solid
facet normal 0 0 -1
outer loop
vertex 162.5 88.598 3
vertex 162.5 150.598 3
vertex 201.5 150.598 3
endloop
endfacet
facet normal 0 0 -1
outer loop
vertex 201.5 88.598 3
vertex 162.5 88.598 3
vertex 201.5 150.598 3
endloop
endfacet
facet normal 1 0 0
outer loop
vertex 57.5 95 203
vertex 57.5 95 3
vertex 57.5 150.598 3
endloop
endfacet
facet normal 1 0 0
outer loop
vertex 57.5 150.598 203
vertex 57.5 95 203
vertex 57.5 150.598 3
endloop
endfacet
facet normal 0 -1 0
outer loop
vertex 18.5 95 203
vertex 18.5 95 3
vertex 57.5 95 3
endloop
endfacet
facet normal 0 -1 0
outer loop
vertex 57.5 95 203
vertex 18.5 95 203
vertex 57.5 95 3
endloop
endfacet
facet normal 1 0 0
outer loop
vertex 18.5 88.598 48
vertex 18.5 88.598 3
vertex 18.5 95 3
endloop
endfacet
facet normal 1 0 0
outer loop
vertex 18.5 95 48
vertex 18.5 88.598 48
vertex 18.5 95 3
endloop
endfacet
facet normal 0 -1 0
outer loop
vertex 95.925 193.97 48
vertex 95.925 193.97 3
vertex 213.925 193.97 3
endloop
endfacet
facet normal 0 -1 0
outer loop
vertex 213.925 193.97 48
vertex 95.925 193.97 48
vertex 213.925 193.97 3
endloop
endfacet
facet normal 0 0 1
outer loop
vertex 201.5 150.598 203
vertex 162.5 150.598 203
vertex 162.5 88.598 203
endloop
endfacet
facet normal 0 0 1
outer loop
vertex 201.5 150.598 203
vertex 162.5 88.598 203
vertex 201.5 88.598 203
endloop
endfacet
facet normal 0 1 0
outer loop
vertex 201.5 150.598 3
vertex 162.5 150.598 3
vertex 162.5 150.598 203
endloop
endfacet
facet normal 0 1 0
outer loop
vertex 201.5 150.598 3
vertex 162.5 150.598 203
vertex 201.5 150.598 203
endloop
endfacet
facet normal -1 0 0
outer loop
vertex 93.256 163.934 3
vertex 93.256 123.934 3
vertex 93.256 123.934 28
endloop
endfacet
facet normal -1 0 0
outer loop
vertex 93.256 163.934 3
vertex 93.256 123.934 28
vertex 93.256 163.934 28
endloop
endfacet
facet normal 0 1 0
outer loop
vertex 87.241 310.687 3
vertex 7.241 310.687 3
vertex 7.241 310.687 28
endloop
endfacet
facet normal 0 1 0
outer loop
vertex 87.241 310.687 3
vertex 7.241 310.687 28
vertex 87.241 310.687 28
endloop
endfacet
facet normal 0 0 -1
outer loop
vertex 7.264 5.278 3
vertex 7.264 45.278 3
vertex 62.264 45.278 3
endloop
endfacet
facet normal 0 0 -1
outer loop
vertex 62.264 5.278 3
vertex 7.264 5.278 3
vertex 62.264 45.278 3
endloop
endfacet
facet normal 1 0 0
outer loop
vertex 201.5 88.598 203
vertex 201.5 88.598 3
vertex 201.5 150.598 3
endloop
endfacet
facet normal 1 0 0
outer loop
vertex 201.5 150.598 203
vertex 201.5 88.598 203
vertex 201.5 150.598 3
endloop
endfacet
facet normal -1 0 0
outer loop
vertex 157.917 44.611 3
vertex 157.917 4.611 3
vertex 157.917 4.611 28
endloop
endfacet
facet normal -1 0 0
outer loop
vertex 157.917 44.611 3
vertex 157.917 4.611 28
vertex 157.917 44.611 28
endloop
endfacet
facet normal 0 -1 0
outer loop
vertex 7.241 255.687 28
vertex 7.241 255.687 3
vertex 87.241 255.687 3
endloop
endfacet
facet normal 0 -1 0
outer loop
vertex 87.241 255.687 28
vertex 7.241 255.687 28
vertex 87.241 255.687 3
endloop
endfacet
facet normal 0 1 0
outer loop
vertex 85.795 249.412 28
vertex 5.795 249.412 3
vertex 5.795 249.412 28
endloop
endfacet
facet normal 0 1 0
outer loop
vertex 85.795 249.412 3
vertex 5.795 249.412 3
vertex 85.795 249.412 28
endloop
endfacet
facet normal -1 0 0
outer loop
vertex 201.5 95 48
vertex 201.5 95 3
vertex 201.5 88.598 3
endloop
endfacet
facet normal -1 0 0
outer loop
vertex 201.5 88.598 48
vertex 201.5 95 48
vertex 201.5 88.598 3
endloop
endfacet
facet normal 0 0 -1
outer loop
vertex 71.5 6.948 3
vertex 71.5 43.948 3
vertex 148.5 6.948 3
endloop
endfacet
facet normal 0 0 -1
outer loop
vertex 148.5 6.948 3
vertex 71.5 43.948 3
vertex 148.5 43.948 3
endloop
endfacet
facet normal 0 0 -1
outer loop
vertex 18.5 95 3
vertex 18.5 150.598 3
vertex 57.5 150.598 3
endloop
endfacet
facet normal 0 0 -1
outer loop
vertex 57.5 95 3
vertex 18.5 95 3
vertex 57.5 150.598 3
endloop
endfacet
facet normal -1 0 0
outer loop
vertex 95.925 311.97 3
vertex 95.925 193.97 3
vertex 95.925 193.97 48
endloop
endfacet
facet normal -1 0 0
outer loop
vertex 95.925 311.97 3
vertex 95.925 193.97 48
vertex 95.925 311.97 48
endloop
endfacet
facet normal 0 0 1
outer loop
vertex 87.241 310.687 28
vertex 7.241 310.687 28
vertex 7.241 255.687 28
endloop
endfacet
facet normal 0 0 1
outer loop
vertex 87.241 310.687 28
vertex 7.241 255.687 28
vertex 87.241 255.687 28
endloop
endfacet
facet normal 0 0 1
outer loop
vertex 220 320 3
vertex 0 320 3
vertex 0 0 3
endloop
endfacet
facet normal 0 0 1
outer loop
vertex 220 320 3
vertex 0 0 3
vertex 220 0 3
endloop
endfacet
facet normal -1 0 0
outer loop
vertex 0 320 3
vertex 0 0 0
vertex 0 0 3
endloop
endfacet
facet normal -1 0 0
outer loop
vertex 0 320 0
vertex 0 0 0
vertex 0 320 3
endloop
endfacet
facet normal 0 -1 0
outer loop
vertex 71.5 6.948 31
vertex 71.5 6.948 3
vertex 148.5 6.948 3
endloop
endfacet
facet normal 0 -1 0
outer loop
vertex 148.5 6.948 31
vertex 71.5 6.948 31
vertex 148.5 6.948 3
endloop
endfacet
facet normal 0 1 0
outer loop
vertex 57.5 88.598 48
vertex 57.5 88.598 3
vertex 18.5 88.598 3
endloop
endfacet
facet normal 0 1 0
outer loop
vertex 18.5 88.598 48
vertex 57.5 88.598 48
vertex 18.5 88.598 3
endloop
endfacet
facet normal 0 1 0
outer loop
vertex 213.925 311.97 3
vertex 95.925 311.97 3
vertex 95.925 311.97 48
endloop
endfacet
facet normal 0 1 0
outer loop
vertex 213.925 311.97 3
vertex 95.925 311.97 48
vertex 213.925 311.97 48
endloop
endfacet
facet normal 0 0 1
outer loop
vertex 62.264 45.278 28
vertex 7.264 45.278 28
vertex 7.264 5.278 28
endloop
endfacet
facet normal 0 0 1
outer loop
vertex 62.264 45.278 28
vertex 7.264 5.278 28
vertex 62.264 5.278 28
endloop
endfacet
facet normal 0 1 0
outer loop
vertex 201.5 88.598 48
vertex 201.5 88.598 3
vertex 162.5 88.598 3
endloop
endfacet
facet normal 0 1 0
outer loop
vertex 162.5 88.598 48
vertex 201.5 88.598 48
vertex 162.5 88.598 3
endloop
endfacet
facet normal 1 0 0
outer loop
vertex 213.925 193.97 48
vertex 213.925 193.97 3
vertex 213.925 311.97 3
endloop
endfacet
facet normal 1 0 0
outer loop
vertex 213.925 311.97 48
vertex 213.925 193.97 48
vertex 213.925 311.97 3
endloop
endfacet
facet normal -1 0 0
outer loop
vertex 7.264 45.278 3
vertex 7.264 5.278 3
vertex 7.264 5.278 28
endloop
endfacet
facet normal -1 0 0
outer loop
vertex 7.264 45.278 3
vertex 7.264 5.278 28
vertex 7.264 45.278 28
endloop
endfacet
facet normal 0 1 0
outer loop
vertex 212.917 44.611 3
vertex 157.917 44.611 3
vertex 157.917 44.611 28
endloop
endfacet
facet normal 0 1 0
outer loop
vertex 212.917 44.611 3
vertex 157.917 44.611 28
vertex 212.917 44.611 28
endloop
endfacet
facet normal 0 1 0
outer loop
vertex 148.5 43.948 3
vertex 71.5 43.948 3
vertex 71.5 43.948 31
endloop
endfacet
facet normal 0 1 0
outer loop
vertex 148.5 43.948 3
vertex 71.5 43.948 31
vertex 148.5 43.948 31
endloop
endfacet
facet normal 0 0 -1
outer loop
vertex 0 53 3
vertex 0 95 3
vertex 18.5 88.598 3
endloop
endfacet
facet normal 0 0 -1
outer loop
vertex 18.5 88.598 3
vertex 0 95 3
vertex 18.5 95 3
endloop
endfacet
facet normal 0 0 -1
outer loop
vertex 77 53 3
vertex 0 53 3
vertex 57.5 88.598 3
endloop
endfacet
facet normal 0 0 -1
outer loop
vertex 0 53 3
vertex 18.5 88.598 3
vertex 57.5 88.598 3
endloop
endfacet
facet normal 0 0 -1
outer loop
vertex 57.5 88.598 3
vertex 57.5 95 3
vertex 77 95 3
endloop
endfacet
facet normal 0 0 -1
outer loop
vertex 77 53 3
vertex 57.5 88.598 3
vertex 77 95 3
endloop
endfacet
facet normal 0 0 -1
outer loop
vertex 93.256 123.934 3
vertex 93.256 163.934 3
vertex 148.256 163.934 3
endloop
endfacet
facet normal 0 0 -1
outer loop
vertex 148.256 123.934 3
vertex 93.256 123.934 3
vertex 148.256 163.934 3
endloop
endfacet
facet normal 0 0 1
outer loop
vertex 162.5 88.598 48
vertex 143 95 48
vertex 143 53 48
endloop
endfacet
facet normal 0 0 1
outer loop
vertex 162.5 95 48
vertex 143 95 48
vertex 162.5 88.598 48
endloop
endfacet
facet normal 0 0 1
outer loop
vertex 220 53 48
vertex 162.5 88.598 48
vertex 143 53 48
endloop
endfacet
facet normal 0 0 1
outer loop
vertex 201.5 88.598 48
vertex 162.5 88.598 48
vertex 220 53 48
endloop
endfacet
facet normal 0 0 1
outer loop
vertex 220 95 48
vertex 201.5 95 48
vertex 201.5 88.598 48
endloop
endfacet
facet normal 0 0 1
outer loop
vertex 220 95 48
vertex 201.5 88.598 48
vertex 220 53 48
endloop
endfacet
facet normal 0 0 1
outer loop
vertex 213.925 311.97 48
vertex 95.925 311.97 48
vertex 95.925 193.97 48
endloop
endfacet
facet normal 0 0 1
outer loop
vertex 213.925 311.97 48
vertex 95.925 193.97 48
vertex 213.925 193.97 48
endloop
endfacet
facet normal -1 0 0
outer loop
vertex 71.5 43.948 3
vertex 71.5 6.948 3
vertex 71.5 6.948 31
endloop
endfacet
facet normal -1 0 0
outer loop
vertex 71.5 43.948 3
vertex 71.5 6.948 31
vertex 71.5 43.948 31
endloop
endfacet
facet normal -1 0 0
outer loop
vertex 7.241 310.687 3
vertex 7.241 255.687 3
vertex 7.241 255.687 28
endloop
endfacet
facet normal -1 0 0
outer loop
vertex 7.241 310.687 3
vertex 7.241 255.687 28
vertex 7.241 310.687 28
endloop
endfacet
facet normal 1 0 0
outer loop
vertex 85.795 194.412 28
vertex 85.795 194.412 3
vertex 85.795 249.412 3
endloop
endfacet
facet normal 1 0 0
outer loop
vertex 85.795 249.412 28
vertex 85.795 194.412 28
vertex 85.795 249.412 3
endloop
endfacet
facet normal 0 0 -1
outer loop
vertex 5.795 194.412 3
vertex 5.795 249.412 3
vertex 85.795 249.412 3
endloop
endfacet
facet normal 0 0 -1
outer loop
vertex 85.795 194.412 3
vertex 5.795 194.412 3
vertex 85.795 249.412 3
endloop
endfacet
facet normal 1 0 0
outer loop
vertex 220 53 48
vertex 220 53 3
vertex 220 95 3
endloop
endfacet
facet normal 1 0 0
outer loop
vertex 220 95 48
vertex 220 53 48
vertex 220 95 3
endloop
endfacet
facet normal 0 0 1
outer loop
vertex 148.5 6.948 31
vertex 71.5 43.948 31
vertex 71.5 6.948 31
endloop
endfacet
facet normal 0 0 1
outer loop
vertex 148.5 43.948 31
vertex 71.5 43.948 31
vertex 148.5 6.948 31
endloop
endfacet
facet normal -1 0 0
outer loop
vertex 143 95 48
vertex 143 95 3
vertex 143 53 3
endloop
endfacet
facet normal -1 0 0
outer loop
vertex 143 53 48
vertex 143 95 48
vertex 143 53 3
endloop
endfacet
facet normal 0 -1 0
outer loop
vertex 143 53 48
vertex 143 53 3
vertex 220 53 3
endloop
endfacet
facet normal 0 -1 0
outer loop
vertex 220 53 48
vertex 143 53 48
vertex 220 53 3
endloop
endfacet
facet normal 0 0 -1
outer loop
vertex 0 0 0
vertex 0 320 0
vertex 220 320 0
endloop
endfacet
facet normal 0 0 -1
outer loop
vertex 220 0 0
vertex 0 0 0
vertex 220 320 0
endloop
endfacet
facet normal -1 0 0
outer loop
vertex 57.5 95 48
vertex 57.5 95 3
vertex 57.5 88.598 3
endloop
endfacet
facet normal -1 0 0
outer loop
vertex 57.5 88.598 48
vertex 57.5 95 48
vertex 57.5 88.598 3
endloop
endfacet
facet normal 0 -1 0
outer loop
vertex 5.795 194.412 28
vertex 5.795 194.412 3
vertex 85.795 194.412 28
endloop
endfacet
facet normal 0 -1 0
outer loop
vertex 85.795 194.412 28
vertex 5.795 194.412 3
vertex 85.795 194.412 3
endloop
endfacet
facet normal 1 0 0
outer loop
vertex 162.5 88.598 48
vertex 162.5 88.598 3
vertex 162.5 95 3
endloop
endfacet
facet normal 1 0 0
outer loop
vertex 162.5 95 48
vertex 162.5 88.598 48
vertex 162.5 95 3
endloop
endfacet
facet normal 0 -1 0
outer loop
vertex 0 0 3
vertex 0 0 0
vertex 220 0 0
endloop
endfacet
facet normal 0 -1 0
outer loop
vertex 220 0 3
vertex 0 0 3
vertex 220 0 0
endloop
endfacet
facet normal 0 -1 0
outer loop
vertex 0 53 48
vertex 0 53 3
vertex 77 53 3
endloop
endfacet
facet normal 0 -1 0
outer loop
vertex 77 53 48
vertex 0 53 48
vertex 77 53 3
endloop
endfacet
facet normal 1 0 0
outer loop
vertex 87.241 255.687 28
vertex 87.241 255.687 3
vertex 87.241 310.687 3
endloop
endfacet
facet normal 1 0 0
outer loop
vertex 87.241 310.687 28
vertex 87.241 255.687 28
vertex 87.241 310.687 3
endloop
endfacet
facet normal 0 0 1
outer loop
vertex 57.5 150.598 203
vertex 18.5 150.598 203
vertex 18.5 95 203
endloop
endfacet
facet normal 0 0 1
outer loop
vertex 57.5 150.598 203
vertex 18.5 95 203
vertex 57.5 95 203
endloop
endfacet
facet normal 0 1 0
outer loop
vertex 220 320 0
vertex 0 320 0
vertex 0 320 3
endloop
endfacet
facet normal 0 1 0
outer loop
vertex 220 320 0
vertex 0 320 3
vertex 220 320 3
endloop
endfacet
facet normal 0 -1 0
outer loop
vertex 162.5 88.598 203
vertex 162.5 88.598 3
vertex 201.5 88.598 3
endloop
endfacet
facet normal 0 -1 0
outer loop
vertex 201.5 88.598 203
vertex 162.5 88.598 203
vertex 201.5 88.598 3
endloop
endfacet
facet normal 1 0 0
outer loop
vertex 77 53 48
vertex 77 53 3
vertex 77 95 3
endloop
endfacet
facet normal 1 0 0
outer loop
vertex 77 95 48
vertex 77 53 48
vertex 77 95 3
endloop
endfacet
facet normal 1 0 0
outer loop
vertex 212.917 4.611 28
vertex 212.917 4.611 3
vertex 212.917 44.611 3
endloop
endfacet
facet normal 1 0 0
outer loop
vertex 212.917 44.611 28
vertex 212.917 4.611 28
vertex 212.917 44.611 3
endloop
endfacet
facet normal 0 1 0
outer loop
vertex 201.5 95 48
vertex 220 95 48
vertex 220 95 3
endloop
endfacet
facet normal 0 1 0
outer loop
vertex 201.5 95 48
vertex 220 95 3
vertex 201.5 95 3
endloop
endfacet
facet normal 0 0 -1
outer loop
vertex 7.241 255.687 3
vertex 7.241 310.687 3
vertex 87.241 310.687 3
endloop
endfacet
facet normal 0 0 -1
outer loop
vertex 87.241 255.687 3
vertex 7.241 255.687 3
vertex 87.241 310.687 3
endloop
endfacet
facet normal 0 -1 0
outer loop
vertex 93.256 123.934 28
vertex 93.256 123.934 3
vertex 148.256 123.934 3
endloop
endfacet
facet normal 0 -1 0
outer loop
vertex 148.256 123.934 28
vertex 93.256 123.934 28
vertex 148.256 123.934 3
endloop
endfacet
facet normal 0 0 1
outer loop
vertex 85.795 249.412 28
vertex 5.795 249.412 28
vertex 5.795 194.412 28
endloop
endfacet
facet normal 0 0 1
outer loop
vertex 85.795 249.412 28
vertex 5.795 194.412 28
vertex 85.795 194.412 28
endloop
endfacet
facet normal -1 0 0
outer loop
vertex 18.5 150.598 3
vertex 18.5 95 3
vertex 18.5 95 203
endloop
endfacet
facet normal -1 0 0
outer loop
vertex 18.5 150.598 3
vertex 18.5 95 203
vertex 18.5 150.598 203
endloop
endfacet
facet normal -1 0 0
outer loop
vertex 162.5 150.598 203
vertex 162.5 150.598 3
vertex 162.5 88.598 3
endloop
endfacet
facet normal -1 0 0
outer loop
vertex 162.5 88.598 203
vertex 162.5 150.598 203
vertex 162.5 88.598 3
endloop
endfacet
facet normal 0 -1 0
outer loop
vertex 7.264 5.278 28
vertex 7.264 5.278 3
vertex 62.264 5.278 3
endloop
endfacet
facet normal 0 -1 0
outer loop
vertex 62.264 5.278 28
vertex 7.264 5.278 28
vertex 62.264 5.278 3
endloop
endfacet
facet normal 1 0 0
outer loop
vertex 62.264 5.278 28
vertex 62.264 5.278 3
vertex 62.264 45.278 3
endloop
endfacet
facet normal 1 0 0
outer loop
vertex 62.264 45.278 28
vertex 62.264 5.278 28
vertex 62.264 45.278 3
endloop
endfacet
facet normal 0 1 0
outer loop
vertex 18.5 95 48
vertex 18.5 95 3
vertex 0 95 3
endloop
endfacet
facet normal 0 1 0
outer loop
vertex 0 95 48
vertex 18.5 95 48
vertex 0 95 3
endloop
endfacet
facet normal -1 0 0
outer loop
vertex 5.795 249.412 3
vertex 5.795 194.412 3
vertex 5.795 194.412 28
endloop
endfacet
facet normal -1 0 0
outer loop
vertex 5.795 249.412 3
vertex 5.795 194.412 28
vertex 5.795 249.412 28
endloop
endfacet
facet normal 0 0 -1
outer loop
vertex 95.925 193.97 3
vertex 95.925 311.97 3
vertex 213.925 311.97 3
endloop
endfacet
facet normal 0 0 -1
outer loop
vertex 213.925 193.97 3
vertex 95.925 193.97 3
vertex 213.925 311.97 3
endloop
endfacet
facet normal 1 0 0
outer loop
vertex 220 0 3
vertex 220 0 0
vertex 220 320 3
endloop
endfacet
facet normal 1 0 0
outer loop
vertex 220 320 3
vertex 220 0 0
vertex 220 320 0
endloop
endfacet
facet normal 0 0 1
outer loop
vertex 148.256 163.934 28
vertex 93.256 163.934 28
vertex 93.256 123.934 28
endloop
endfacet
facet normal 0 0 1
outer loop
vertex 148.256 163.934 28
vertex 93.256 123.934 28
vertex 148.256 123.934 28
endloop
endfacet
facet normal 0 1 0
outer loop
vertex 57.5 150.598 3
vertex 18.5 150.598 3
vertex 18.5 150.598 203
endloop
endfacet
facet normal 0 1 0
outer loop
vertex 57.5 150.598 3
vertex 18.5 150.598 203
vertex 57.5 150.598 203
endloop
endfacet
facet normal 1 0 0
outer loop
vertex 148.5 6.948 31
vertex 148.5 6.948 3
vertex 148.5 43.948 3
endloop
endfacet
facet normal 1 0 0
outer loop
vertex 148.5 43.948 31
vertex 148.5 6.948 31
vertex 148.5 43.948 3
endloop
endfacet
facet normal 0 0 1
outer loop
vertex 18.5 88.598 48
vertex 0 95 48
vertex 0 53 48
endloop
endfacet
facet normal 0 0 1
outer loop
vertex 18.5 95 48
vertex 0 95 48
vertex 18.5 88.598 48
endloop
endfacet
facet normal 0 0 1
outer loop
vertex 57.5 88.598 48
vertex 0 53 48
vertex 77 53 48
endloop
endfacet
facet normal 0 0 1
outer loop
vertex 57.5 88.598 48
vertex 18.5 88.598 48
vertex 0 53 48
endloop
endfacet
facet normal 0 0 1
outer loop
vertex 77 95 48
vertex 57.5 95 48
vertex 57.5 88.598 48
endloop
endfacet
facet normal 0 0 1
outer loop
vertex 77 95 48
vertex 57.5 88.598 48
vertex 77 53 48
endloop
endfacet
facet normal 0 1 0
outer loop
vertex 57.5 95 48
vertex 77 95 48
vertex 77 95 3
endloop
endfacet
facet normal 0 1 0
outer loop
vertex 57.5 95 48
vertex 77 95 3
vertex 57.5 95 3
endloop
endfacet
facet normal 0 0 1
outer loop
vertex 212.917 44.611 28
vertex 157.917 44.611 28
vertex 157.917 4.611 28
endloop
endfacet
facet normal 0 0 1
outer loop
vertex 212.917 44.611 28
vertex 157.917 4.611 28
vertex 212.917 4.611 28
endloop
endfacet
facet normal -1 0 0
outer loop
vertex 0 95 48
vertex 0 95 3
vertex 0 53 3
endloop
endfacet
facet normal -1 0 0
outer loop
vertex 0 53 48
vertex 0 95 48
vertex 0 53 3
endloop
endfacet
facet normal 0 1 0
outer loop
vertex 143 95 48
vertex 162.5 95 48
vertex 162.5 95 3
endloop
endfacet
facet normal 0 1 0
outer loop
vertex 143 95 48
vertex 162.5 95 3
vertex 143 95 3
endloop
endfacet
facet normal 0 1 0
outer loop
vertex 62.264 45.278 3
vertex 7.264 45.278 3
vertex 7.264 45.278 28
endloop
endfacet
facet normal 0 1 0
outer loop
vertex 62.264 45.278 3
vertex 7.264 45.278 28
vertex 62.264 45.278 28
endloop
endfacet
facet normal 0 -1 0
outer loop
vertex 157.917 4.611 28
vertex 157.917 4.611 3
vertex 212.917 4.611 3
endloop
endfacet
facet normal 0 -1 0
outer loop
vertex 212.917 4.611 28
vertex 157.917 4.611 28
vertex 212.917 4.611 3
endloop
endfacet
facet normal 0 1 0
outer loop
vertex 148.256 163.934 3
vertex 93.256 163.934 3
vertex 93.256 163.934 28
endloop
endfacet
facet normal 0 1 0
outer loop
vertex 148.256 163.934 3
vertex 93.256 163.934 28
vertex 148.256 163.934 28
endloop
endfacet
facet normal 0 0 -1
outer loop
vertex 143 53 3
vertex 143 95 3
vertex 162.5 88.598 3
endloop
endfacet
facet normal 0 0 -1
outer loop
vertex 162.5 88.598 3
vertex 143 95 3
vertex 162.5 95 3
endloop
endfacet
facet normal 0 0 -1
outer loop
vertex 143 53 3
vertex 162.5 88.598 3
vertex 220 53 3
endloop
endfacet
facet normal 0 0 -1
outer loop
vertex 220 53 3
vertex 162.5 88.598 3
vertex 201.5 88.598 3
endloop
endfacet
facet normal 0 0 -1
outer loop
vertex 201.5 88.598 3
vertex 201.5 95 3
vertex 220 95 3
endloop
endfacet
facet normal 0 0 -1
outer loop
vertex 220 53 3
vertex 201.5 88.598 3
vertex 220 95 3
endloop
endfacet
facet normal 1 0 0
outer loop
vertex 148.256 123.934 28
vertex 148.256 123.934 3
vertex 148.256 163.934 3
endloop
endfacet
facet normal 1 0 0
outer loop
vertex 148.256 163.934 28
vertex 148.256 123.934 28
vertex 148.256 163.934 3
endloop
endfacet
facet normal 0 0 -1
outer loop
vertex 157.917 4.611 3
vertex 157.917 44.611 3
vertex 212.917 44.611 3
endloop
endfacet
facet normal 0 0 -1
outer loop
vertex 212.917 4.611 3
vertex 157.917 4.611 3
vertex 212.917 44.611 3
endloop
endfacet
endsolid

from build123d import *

# Parameters (mm, degrees)
F0_W     = 220
F0_H     = 320
F1_DEPTH = 3
F2_W     = 118
F2_H     = 118
F3_DEPTH = 45
F2_W_2   = 39
F2_H_2   = 55.5978671312
F2_H_3   = 6.4021328688
F4_DEPTH = 200
F2_W_3   = 55
F2_H_4   = 40
F5_DEPTH = 25
F2_W_4   = 80
F2_H_5   = 55
F6_DEPTH = 25
F7_DEPTH = 45
F2_W_5   = 77
F2_H_6   = 37
F8_DEPTH = 28


with BuildPart() as f1:
    # F0 (on Top) → F1 (new body)
    with BuildSketch(Plane.XY):
        with Locations((110, 160)):
            Rectangle(F0_W, F0_H)
    extrude(amount=F1_DEPTH)


with BuildPart() as f3:
    # F2 (on face) → F3 (new body)
    with BuildSketch(Plane.XY.offset(3)):
        with Locations((154.9253612757, 252.969533205)):
            Rectangle(F2_W, F2_H)
    extrude(amount=F3_DEPTH)


with BuildPart() as f4:
    # F2 (on face) → F4 (new body)
    with BuildSketch(Plane.XY.offset(3)):
        with Locations((182, 122.7989335656)):
            Rectangle(F2_W_2, F2_H_2)
        with Locations((182, 91.7989335656)):
            Rectangle(F2_W_2, F2_H_3)
    extrude(amount=F4_DEPTH)


with BuildPart() as f4b:
    # F2 (on face) → F4, piece 2 (new body)
    with BuildSketch(Plane.XY.offset(3)):
        with Locations((38, 122.7989335656)):
            Rectangle(F2_W_2, F2_H_2)
    extrude(amount=F4_DEPTH)


with BuildPart() as f5:
    # F2 (on face) → F5 (new body)
    with BuildSketch(Plane.XY.offset(3)):
        with Locations((120.7562312484, 143.9338475466)):
            Rectangle(F2_W_3, F2_H_4)
    extrude(amount=F5_DEPTH)


with BuildPart() as f5b:
    # F2 (on face) → F5, piece 2 (new body)
    with BuildSketch(Plane.XY.offset(3)):
        with Locations((34.76376459, 25.2775717527)):
            Rectangle(F2_W_3, F2_H_4)
    extrude(amount=F5_DEPTH)


with BuildPart() as f5c:
    # F2 (on face) → F5, piece 3 (new body)
    with BuildSketch(Plane.XY.offset(3)):
        with Locations((185.4172348976, 24.6109683067)):
            Rectangle(F2_W_3, F2_H_4)
    extrude(amount=F5_DEPTH)


with BuildPart() as f6:
    # F2 (on face) → F6 (new body)
    with BuildSketch(Plane.XY.offset(3)):
        with Locations((47.2405478358, 283.1874191761)):
            Rectangle(F2_W_4, F2_H_5)
    extrude(amount=F6_DEPTH)


with BuildPart() as f6b:
    # F2 (on face) → F6, piece 2 (new body)
    with BuildSketch(Plane.XY.offset(3)):
        with Locations((45.7953847945, 221.912458539)):
            Rectangle(F2_W_4, F2_H_5)
    extrude(amount=F6_DEPTH)


with BuildPart() as f7:
    # F2 (on face) → F7 (new body)
    with BuildSketch(Plane.XY.offset(3)):
        Polygon((18.5, 95), (0, 95), (0, 53), (77, 53), (77, 95), (57.5, 95), (57.5, 88.5978671312), (18.5, 88.5978671312), align=None)
    extrude(amount=F7_DEPTH)


with BuildPart() as f7b:
    # F2 (on face) → F7, piece 2 (new body)
    with BuildSketch(Plane.XY.offset(3)):
        Polygon((220, 53), (220, 95), (201.5, 95), (201.5, 88.5978671312), (162.5, 88.5978671312), (162.5, 95), (143, 95), (143, 53), align=None)
    extrude(amount=F7_DEPTH)


with BuildPart() as f8:
    # F2 (on face) → F8 (new body)
    with BuildSketch(Plane.XY.offset(3)):
        with Locations((110, 25.4482738674)):
            Rectangle(F2_W_5, F2_H_6)
    extrude(amount=F8_DEPTH)


solid = Compound([f1.part, f3.part, f4.part, f4b.part, f5.part, f5b.part, f5c.part, f6.part, f6b.part, f7.part, f7b.part, f8.part])
